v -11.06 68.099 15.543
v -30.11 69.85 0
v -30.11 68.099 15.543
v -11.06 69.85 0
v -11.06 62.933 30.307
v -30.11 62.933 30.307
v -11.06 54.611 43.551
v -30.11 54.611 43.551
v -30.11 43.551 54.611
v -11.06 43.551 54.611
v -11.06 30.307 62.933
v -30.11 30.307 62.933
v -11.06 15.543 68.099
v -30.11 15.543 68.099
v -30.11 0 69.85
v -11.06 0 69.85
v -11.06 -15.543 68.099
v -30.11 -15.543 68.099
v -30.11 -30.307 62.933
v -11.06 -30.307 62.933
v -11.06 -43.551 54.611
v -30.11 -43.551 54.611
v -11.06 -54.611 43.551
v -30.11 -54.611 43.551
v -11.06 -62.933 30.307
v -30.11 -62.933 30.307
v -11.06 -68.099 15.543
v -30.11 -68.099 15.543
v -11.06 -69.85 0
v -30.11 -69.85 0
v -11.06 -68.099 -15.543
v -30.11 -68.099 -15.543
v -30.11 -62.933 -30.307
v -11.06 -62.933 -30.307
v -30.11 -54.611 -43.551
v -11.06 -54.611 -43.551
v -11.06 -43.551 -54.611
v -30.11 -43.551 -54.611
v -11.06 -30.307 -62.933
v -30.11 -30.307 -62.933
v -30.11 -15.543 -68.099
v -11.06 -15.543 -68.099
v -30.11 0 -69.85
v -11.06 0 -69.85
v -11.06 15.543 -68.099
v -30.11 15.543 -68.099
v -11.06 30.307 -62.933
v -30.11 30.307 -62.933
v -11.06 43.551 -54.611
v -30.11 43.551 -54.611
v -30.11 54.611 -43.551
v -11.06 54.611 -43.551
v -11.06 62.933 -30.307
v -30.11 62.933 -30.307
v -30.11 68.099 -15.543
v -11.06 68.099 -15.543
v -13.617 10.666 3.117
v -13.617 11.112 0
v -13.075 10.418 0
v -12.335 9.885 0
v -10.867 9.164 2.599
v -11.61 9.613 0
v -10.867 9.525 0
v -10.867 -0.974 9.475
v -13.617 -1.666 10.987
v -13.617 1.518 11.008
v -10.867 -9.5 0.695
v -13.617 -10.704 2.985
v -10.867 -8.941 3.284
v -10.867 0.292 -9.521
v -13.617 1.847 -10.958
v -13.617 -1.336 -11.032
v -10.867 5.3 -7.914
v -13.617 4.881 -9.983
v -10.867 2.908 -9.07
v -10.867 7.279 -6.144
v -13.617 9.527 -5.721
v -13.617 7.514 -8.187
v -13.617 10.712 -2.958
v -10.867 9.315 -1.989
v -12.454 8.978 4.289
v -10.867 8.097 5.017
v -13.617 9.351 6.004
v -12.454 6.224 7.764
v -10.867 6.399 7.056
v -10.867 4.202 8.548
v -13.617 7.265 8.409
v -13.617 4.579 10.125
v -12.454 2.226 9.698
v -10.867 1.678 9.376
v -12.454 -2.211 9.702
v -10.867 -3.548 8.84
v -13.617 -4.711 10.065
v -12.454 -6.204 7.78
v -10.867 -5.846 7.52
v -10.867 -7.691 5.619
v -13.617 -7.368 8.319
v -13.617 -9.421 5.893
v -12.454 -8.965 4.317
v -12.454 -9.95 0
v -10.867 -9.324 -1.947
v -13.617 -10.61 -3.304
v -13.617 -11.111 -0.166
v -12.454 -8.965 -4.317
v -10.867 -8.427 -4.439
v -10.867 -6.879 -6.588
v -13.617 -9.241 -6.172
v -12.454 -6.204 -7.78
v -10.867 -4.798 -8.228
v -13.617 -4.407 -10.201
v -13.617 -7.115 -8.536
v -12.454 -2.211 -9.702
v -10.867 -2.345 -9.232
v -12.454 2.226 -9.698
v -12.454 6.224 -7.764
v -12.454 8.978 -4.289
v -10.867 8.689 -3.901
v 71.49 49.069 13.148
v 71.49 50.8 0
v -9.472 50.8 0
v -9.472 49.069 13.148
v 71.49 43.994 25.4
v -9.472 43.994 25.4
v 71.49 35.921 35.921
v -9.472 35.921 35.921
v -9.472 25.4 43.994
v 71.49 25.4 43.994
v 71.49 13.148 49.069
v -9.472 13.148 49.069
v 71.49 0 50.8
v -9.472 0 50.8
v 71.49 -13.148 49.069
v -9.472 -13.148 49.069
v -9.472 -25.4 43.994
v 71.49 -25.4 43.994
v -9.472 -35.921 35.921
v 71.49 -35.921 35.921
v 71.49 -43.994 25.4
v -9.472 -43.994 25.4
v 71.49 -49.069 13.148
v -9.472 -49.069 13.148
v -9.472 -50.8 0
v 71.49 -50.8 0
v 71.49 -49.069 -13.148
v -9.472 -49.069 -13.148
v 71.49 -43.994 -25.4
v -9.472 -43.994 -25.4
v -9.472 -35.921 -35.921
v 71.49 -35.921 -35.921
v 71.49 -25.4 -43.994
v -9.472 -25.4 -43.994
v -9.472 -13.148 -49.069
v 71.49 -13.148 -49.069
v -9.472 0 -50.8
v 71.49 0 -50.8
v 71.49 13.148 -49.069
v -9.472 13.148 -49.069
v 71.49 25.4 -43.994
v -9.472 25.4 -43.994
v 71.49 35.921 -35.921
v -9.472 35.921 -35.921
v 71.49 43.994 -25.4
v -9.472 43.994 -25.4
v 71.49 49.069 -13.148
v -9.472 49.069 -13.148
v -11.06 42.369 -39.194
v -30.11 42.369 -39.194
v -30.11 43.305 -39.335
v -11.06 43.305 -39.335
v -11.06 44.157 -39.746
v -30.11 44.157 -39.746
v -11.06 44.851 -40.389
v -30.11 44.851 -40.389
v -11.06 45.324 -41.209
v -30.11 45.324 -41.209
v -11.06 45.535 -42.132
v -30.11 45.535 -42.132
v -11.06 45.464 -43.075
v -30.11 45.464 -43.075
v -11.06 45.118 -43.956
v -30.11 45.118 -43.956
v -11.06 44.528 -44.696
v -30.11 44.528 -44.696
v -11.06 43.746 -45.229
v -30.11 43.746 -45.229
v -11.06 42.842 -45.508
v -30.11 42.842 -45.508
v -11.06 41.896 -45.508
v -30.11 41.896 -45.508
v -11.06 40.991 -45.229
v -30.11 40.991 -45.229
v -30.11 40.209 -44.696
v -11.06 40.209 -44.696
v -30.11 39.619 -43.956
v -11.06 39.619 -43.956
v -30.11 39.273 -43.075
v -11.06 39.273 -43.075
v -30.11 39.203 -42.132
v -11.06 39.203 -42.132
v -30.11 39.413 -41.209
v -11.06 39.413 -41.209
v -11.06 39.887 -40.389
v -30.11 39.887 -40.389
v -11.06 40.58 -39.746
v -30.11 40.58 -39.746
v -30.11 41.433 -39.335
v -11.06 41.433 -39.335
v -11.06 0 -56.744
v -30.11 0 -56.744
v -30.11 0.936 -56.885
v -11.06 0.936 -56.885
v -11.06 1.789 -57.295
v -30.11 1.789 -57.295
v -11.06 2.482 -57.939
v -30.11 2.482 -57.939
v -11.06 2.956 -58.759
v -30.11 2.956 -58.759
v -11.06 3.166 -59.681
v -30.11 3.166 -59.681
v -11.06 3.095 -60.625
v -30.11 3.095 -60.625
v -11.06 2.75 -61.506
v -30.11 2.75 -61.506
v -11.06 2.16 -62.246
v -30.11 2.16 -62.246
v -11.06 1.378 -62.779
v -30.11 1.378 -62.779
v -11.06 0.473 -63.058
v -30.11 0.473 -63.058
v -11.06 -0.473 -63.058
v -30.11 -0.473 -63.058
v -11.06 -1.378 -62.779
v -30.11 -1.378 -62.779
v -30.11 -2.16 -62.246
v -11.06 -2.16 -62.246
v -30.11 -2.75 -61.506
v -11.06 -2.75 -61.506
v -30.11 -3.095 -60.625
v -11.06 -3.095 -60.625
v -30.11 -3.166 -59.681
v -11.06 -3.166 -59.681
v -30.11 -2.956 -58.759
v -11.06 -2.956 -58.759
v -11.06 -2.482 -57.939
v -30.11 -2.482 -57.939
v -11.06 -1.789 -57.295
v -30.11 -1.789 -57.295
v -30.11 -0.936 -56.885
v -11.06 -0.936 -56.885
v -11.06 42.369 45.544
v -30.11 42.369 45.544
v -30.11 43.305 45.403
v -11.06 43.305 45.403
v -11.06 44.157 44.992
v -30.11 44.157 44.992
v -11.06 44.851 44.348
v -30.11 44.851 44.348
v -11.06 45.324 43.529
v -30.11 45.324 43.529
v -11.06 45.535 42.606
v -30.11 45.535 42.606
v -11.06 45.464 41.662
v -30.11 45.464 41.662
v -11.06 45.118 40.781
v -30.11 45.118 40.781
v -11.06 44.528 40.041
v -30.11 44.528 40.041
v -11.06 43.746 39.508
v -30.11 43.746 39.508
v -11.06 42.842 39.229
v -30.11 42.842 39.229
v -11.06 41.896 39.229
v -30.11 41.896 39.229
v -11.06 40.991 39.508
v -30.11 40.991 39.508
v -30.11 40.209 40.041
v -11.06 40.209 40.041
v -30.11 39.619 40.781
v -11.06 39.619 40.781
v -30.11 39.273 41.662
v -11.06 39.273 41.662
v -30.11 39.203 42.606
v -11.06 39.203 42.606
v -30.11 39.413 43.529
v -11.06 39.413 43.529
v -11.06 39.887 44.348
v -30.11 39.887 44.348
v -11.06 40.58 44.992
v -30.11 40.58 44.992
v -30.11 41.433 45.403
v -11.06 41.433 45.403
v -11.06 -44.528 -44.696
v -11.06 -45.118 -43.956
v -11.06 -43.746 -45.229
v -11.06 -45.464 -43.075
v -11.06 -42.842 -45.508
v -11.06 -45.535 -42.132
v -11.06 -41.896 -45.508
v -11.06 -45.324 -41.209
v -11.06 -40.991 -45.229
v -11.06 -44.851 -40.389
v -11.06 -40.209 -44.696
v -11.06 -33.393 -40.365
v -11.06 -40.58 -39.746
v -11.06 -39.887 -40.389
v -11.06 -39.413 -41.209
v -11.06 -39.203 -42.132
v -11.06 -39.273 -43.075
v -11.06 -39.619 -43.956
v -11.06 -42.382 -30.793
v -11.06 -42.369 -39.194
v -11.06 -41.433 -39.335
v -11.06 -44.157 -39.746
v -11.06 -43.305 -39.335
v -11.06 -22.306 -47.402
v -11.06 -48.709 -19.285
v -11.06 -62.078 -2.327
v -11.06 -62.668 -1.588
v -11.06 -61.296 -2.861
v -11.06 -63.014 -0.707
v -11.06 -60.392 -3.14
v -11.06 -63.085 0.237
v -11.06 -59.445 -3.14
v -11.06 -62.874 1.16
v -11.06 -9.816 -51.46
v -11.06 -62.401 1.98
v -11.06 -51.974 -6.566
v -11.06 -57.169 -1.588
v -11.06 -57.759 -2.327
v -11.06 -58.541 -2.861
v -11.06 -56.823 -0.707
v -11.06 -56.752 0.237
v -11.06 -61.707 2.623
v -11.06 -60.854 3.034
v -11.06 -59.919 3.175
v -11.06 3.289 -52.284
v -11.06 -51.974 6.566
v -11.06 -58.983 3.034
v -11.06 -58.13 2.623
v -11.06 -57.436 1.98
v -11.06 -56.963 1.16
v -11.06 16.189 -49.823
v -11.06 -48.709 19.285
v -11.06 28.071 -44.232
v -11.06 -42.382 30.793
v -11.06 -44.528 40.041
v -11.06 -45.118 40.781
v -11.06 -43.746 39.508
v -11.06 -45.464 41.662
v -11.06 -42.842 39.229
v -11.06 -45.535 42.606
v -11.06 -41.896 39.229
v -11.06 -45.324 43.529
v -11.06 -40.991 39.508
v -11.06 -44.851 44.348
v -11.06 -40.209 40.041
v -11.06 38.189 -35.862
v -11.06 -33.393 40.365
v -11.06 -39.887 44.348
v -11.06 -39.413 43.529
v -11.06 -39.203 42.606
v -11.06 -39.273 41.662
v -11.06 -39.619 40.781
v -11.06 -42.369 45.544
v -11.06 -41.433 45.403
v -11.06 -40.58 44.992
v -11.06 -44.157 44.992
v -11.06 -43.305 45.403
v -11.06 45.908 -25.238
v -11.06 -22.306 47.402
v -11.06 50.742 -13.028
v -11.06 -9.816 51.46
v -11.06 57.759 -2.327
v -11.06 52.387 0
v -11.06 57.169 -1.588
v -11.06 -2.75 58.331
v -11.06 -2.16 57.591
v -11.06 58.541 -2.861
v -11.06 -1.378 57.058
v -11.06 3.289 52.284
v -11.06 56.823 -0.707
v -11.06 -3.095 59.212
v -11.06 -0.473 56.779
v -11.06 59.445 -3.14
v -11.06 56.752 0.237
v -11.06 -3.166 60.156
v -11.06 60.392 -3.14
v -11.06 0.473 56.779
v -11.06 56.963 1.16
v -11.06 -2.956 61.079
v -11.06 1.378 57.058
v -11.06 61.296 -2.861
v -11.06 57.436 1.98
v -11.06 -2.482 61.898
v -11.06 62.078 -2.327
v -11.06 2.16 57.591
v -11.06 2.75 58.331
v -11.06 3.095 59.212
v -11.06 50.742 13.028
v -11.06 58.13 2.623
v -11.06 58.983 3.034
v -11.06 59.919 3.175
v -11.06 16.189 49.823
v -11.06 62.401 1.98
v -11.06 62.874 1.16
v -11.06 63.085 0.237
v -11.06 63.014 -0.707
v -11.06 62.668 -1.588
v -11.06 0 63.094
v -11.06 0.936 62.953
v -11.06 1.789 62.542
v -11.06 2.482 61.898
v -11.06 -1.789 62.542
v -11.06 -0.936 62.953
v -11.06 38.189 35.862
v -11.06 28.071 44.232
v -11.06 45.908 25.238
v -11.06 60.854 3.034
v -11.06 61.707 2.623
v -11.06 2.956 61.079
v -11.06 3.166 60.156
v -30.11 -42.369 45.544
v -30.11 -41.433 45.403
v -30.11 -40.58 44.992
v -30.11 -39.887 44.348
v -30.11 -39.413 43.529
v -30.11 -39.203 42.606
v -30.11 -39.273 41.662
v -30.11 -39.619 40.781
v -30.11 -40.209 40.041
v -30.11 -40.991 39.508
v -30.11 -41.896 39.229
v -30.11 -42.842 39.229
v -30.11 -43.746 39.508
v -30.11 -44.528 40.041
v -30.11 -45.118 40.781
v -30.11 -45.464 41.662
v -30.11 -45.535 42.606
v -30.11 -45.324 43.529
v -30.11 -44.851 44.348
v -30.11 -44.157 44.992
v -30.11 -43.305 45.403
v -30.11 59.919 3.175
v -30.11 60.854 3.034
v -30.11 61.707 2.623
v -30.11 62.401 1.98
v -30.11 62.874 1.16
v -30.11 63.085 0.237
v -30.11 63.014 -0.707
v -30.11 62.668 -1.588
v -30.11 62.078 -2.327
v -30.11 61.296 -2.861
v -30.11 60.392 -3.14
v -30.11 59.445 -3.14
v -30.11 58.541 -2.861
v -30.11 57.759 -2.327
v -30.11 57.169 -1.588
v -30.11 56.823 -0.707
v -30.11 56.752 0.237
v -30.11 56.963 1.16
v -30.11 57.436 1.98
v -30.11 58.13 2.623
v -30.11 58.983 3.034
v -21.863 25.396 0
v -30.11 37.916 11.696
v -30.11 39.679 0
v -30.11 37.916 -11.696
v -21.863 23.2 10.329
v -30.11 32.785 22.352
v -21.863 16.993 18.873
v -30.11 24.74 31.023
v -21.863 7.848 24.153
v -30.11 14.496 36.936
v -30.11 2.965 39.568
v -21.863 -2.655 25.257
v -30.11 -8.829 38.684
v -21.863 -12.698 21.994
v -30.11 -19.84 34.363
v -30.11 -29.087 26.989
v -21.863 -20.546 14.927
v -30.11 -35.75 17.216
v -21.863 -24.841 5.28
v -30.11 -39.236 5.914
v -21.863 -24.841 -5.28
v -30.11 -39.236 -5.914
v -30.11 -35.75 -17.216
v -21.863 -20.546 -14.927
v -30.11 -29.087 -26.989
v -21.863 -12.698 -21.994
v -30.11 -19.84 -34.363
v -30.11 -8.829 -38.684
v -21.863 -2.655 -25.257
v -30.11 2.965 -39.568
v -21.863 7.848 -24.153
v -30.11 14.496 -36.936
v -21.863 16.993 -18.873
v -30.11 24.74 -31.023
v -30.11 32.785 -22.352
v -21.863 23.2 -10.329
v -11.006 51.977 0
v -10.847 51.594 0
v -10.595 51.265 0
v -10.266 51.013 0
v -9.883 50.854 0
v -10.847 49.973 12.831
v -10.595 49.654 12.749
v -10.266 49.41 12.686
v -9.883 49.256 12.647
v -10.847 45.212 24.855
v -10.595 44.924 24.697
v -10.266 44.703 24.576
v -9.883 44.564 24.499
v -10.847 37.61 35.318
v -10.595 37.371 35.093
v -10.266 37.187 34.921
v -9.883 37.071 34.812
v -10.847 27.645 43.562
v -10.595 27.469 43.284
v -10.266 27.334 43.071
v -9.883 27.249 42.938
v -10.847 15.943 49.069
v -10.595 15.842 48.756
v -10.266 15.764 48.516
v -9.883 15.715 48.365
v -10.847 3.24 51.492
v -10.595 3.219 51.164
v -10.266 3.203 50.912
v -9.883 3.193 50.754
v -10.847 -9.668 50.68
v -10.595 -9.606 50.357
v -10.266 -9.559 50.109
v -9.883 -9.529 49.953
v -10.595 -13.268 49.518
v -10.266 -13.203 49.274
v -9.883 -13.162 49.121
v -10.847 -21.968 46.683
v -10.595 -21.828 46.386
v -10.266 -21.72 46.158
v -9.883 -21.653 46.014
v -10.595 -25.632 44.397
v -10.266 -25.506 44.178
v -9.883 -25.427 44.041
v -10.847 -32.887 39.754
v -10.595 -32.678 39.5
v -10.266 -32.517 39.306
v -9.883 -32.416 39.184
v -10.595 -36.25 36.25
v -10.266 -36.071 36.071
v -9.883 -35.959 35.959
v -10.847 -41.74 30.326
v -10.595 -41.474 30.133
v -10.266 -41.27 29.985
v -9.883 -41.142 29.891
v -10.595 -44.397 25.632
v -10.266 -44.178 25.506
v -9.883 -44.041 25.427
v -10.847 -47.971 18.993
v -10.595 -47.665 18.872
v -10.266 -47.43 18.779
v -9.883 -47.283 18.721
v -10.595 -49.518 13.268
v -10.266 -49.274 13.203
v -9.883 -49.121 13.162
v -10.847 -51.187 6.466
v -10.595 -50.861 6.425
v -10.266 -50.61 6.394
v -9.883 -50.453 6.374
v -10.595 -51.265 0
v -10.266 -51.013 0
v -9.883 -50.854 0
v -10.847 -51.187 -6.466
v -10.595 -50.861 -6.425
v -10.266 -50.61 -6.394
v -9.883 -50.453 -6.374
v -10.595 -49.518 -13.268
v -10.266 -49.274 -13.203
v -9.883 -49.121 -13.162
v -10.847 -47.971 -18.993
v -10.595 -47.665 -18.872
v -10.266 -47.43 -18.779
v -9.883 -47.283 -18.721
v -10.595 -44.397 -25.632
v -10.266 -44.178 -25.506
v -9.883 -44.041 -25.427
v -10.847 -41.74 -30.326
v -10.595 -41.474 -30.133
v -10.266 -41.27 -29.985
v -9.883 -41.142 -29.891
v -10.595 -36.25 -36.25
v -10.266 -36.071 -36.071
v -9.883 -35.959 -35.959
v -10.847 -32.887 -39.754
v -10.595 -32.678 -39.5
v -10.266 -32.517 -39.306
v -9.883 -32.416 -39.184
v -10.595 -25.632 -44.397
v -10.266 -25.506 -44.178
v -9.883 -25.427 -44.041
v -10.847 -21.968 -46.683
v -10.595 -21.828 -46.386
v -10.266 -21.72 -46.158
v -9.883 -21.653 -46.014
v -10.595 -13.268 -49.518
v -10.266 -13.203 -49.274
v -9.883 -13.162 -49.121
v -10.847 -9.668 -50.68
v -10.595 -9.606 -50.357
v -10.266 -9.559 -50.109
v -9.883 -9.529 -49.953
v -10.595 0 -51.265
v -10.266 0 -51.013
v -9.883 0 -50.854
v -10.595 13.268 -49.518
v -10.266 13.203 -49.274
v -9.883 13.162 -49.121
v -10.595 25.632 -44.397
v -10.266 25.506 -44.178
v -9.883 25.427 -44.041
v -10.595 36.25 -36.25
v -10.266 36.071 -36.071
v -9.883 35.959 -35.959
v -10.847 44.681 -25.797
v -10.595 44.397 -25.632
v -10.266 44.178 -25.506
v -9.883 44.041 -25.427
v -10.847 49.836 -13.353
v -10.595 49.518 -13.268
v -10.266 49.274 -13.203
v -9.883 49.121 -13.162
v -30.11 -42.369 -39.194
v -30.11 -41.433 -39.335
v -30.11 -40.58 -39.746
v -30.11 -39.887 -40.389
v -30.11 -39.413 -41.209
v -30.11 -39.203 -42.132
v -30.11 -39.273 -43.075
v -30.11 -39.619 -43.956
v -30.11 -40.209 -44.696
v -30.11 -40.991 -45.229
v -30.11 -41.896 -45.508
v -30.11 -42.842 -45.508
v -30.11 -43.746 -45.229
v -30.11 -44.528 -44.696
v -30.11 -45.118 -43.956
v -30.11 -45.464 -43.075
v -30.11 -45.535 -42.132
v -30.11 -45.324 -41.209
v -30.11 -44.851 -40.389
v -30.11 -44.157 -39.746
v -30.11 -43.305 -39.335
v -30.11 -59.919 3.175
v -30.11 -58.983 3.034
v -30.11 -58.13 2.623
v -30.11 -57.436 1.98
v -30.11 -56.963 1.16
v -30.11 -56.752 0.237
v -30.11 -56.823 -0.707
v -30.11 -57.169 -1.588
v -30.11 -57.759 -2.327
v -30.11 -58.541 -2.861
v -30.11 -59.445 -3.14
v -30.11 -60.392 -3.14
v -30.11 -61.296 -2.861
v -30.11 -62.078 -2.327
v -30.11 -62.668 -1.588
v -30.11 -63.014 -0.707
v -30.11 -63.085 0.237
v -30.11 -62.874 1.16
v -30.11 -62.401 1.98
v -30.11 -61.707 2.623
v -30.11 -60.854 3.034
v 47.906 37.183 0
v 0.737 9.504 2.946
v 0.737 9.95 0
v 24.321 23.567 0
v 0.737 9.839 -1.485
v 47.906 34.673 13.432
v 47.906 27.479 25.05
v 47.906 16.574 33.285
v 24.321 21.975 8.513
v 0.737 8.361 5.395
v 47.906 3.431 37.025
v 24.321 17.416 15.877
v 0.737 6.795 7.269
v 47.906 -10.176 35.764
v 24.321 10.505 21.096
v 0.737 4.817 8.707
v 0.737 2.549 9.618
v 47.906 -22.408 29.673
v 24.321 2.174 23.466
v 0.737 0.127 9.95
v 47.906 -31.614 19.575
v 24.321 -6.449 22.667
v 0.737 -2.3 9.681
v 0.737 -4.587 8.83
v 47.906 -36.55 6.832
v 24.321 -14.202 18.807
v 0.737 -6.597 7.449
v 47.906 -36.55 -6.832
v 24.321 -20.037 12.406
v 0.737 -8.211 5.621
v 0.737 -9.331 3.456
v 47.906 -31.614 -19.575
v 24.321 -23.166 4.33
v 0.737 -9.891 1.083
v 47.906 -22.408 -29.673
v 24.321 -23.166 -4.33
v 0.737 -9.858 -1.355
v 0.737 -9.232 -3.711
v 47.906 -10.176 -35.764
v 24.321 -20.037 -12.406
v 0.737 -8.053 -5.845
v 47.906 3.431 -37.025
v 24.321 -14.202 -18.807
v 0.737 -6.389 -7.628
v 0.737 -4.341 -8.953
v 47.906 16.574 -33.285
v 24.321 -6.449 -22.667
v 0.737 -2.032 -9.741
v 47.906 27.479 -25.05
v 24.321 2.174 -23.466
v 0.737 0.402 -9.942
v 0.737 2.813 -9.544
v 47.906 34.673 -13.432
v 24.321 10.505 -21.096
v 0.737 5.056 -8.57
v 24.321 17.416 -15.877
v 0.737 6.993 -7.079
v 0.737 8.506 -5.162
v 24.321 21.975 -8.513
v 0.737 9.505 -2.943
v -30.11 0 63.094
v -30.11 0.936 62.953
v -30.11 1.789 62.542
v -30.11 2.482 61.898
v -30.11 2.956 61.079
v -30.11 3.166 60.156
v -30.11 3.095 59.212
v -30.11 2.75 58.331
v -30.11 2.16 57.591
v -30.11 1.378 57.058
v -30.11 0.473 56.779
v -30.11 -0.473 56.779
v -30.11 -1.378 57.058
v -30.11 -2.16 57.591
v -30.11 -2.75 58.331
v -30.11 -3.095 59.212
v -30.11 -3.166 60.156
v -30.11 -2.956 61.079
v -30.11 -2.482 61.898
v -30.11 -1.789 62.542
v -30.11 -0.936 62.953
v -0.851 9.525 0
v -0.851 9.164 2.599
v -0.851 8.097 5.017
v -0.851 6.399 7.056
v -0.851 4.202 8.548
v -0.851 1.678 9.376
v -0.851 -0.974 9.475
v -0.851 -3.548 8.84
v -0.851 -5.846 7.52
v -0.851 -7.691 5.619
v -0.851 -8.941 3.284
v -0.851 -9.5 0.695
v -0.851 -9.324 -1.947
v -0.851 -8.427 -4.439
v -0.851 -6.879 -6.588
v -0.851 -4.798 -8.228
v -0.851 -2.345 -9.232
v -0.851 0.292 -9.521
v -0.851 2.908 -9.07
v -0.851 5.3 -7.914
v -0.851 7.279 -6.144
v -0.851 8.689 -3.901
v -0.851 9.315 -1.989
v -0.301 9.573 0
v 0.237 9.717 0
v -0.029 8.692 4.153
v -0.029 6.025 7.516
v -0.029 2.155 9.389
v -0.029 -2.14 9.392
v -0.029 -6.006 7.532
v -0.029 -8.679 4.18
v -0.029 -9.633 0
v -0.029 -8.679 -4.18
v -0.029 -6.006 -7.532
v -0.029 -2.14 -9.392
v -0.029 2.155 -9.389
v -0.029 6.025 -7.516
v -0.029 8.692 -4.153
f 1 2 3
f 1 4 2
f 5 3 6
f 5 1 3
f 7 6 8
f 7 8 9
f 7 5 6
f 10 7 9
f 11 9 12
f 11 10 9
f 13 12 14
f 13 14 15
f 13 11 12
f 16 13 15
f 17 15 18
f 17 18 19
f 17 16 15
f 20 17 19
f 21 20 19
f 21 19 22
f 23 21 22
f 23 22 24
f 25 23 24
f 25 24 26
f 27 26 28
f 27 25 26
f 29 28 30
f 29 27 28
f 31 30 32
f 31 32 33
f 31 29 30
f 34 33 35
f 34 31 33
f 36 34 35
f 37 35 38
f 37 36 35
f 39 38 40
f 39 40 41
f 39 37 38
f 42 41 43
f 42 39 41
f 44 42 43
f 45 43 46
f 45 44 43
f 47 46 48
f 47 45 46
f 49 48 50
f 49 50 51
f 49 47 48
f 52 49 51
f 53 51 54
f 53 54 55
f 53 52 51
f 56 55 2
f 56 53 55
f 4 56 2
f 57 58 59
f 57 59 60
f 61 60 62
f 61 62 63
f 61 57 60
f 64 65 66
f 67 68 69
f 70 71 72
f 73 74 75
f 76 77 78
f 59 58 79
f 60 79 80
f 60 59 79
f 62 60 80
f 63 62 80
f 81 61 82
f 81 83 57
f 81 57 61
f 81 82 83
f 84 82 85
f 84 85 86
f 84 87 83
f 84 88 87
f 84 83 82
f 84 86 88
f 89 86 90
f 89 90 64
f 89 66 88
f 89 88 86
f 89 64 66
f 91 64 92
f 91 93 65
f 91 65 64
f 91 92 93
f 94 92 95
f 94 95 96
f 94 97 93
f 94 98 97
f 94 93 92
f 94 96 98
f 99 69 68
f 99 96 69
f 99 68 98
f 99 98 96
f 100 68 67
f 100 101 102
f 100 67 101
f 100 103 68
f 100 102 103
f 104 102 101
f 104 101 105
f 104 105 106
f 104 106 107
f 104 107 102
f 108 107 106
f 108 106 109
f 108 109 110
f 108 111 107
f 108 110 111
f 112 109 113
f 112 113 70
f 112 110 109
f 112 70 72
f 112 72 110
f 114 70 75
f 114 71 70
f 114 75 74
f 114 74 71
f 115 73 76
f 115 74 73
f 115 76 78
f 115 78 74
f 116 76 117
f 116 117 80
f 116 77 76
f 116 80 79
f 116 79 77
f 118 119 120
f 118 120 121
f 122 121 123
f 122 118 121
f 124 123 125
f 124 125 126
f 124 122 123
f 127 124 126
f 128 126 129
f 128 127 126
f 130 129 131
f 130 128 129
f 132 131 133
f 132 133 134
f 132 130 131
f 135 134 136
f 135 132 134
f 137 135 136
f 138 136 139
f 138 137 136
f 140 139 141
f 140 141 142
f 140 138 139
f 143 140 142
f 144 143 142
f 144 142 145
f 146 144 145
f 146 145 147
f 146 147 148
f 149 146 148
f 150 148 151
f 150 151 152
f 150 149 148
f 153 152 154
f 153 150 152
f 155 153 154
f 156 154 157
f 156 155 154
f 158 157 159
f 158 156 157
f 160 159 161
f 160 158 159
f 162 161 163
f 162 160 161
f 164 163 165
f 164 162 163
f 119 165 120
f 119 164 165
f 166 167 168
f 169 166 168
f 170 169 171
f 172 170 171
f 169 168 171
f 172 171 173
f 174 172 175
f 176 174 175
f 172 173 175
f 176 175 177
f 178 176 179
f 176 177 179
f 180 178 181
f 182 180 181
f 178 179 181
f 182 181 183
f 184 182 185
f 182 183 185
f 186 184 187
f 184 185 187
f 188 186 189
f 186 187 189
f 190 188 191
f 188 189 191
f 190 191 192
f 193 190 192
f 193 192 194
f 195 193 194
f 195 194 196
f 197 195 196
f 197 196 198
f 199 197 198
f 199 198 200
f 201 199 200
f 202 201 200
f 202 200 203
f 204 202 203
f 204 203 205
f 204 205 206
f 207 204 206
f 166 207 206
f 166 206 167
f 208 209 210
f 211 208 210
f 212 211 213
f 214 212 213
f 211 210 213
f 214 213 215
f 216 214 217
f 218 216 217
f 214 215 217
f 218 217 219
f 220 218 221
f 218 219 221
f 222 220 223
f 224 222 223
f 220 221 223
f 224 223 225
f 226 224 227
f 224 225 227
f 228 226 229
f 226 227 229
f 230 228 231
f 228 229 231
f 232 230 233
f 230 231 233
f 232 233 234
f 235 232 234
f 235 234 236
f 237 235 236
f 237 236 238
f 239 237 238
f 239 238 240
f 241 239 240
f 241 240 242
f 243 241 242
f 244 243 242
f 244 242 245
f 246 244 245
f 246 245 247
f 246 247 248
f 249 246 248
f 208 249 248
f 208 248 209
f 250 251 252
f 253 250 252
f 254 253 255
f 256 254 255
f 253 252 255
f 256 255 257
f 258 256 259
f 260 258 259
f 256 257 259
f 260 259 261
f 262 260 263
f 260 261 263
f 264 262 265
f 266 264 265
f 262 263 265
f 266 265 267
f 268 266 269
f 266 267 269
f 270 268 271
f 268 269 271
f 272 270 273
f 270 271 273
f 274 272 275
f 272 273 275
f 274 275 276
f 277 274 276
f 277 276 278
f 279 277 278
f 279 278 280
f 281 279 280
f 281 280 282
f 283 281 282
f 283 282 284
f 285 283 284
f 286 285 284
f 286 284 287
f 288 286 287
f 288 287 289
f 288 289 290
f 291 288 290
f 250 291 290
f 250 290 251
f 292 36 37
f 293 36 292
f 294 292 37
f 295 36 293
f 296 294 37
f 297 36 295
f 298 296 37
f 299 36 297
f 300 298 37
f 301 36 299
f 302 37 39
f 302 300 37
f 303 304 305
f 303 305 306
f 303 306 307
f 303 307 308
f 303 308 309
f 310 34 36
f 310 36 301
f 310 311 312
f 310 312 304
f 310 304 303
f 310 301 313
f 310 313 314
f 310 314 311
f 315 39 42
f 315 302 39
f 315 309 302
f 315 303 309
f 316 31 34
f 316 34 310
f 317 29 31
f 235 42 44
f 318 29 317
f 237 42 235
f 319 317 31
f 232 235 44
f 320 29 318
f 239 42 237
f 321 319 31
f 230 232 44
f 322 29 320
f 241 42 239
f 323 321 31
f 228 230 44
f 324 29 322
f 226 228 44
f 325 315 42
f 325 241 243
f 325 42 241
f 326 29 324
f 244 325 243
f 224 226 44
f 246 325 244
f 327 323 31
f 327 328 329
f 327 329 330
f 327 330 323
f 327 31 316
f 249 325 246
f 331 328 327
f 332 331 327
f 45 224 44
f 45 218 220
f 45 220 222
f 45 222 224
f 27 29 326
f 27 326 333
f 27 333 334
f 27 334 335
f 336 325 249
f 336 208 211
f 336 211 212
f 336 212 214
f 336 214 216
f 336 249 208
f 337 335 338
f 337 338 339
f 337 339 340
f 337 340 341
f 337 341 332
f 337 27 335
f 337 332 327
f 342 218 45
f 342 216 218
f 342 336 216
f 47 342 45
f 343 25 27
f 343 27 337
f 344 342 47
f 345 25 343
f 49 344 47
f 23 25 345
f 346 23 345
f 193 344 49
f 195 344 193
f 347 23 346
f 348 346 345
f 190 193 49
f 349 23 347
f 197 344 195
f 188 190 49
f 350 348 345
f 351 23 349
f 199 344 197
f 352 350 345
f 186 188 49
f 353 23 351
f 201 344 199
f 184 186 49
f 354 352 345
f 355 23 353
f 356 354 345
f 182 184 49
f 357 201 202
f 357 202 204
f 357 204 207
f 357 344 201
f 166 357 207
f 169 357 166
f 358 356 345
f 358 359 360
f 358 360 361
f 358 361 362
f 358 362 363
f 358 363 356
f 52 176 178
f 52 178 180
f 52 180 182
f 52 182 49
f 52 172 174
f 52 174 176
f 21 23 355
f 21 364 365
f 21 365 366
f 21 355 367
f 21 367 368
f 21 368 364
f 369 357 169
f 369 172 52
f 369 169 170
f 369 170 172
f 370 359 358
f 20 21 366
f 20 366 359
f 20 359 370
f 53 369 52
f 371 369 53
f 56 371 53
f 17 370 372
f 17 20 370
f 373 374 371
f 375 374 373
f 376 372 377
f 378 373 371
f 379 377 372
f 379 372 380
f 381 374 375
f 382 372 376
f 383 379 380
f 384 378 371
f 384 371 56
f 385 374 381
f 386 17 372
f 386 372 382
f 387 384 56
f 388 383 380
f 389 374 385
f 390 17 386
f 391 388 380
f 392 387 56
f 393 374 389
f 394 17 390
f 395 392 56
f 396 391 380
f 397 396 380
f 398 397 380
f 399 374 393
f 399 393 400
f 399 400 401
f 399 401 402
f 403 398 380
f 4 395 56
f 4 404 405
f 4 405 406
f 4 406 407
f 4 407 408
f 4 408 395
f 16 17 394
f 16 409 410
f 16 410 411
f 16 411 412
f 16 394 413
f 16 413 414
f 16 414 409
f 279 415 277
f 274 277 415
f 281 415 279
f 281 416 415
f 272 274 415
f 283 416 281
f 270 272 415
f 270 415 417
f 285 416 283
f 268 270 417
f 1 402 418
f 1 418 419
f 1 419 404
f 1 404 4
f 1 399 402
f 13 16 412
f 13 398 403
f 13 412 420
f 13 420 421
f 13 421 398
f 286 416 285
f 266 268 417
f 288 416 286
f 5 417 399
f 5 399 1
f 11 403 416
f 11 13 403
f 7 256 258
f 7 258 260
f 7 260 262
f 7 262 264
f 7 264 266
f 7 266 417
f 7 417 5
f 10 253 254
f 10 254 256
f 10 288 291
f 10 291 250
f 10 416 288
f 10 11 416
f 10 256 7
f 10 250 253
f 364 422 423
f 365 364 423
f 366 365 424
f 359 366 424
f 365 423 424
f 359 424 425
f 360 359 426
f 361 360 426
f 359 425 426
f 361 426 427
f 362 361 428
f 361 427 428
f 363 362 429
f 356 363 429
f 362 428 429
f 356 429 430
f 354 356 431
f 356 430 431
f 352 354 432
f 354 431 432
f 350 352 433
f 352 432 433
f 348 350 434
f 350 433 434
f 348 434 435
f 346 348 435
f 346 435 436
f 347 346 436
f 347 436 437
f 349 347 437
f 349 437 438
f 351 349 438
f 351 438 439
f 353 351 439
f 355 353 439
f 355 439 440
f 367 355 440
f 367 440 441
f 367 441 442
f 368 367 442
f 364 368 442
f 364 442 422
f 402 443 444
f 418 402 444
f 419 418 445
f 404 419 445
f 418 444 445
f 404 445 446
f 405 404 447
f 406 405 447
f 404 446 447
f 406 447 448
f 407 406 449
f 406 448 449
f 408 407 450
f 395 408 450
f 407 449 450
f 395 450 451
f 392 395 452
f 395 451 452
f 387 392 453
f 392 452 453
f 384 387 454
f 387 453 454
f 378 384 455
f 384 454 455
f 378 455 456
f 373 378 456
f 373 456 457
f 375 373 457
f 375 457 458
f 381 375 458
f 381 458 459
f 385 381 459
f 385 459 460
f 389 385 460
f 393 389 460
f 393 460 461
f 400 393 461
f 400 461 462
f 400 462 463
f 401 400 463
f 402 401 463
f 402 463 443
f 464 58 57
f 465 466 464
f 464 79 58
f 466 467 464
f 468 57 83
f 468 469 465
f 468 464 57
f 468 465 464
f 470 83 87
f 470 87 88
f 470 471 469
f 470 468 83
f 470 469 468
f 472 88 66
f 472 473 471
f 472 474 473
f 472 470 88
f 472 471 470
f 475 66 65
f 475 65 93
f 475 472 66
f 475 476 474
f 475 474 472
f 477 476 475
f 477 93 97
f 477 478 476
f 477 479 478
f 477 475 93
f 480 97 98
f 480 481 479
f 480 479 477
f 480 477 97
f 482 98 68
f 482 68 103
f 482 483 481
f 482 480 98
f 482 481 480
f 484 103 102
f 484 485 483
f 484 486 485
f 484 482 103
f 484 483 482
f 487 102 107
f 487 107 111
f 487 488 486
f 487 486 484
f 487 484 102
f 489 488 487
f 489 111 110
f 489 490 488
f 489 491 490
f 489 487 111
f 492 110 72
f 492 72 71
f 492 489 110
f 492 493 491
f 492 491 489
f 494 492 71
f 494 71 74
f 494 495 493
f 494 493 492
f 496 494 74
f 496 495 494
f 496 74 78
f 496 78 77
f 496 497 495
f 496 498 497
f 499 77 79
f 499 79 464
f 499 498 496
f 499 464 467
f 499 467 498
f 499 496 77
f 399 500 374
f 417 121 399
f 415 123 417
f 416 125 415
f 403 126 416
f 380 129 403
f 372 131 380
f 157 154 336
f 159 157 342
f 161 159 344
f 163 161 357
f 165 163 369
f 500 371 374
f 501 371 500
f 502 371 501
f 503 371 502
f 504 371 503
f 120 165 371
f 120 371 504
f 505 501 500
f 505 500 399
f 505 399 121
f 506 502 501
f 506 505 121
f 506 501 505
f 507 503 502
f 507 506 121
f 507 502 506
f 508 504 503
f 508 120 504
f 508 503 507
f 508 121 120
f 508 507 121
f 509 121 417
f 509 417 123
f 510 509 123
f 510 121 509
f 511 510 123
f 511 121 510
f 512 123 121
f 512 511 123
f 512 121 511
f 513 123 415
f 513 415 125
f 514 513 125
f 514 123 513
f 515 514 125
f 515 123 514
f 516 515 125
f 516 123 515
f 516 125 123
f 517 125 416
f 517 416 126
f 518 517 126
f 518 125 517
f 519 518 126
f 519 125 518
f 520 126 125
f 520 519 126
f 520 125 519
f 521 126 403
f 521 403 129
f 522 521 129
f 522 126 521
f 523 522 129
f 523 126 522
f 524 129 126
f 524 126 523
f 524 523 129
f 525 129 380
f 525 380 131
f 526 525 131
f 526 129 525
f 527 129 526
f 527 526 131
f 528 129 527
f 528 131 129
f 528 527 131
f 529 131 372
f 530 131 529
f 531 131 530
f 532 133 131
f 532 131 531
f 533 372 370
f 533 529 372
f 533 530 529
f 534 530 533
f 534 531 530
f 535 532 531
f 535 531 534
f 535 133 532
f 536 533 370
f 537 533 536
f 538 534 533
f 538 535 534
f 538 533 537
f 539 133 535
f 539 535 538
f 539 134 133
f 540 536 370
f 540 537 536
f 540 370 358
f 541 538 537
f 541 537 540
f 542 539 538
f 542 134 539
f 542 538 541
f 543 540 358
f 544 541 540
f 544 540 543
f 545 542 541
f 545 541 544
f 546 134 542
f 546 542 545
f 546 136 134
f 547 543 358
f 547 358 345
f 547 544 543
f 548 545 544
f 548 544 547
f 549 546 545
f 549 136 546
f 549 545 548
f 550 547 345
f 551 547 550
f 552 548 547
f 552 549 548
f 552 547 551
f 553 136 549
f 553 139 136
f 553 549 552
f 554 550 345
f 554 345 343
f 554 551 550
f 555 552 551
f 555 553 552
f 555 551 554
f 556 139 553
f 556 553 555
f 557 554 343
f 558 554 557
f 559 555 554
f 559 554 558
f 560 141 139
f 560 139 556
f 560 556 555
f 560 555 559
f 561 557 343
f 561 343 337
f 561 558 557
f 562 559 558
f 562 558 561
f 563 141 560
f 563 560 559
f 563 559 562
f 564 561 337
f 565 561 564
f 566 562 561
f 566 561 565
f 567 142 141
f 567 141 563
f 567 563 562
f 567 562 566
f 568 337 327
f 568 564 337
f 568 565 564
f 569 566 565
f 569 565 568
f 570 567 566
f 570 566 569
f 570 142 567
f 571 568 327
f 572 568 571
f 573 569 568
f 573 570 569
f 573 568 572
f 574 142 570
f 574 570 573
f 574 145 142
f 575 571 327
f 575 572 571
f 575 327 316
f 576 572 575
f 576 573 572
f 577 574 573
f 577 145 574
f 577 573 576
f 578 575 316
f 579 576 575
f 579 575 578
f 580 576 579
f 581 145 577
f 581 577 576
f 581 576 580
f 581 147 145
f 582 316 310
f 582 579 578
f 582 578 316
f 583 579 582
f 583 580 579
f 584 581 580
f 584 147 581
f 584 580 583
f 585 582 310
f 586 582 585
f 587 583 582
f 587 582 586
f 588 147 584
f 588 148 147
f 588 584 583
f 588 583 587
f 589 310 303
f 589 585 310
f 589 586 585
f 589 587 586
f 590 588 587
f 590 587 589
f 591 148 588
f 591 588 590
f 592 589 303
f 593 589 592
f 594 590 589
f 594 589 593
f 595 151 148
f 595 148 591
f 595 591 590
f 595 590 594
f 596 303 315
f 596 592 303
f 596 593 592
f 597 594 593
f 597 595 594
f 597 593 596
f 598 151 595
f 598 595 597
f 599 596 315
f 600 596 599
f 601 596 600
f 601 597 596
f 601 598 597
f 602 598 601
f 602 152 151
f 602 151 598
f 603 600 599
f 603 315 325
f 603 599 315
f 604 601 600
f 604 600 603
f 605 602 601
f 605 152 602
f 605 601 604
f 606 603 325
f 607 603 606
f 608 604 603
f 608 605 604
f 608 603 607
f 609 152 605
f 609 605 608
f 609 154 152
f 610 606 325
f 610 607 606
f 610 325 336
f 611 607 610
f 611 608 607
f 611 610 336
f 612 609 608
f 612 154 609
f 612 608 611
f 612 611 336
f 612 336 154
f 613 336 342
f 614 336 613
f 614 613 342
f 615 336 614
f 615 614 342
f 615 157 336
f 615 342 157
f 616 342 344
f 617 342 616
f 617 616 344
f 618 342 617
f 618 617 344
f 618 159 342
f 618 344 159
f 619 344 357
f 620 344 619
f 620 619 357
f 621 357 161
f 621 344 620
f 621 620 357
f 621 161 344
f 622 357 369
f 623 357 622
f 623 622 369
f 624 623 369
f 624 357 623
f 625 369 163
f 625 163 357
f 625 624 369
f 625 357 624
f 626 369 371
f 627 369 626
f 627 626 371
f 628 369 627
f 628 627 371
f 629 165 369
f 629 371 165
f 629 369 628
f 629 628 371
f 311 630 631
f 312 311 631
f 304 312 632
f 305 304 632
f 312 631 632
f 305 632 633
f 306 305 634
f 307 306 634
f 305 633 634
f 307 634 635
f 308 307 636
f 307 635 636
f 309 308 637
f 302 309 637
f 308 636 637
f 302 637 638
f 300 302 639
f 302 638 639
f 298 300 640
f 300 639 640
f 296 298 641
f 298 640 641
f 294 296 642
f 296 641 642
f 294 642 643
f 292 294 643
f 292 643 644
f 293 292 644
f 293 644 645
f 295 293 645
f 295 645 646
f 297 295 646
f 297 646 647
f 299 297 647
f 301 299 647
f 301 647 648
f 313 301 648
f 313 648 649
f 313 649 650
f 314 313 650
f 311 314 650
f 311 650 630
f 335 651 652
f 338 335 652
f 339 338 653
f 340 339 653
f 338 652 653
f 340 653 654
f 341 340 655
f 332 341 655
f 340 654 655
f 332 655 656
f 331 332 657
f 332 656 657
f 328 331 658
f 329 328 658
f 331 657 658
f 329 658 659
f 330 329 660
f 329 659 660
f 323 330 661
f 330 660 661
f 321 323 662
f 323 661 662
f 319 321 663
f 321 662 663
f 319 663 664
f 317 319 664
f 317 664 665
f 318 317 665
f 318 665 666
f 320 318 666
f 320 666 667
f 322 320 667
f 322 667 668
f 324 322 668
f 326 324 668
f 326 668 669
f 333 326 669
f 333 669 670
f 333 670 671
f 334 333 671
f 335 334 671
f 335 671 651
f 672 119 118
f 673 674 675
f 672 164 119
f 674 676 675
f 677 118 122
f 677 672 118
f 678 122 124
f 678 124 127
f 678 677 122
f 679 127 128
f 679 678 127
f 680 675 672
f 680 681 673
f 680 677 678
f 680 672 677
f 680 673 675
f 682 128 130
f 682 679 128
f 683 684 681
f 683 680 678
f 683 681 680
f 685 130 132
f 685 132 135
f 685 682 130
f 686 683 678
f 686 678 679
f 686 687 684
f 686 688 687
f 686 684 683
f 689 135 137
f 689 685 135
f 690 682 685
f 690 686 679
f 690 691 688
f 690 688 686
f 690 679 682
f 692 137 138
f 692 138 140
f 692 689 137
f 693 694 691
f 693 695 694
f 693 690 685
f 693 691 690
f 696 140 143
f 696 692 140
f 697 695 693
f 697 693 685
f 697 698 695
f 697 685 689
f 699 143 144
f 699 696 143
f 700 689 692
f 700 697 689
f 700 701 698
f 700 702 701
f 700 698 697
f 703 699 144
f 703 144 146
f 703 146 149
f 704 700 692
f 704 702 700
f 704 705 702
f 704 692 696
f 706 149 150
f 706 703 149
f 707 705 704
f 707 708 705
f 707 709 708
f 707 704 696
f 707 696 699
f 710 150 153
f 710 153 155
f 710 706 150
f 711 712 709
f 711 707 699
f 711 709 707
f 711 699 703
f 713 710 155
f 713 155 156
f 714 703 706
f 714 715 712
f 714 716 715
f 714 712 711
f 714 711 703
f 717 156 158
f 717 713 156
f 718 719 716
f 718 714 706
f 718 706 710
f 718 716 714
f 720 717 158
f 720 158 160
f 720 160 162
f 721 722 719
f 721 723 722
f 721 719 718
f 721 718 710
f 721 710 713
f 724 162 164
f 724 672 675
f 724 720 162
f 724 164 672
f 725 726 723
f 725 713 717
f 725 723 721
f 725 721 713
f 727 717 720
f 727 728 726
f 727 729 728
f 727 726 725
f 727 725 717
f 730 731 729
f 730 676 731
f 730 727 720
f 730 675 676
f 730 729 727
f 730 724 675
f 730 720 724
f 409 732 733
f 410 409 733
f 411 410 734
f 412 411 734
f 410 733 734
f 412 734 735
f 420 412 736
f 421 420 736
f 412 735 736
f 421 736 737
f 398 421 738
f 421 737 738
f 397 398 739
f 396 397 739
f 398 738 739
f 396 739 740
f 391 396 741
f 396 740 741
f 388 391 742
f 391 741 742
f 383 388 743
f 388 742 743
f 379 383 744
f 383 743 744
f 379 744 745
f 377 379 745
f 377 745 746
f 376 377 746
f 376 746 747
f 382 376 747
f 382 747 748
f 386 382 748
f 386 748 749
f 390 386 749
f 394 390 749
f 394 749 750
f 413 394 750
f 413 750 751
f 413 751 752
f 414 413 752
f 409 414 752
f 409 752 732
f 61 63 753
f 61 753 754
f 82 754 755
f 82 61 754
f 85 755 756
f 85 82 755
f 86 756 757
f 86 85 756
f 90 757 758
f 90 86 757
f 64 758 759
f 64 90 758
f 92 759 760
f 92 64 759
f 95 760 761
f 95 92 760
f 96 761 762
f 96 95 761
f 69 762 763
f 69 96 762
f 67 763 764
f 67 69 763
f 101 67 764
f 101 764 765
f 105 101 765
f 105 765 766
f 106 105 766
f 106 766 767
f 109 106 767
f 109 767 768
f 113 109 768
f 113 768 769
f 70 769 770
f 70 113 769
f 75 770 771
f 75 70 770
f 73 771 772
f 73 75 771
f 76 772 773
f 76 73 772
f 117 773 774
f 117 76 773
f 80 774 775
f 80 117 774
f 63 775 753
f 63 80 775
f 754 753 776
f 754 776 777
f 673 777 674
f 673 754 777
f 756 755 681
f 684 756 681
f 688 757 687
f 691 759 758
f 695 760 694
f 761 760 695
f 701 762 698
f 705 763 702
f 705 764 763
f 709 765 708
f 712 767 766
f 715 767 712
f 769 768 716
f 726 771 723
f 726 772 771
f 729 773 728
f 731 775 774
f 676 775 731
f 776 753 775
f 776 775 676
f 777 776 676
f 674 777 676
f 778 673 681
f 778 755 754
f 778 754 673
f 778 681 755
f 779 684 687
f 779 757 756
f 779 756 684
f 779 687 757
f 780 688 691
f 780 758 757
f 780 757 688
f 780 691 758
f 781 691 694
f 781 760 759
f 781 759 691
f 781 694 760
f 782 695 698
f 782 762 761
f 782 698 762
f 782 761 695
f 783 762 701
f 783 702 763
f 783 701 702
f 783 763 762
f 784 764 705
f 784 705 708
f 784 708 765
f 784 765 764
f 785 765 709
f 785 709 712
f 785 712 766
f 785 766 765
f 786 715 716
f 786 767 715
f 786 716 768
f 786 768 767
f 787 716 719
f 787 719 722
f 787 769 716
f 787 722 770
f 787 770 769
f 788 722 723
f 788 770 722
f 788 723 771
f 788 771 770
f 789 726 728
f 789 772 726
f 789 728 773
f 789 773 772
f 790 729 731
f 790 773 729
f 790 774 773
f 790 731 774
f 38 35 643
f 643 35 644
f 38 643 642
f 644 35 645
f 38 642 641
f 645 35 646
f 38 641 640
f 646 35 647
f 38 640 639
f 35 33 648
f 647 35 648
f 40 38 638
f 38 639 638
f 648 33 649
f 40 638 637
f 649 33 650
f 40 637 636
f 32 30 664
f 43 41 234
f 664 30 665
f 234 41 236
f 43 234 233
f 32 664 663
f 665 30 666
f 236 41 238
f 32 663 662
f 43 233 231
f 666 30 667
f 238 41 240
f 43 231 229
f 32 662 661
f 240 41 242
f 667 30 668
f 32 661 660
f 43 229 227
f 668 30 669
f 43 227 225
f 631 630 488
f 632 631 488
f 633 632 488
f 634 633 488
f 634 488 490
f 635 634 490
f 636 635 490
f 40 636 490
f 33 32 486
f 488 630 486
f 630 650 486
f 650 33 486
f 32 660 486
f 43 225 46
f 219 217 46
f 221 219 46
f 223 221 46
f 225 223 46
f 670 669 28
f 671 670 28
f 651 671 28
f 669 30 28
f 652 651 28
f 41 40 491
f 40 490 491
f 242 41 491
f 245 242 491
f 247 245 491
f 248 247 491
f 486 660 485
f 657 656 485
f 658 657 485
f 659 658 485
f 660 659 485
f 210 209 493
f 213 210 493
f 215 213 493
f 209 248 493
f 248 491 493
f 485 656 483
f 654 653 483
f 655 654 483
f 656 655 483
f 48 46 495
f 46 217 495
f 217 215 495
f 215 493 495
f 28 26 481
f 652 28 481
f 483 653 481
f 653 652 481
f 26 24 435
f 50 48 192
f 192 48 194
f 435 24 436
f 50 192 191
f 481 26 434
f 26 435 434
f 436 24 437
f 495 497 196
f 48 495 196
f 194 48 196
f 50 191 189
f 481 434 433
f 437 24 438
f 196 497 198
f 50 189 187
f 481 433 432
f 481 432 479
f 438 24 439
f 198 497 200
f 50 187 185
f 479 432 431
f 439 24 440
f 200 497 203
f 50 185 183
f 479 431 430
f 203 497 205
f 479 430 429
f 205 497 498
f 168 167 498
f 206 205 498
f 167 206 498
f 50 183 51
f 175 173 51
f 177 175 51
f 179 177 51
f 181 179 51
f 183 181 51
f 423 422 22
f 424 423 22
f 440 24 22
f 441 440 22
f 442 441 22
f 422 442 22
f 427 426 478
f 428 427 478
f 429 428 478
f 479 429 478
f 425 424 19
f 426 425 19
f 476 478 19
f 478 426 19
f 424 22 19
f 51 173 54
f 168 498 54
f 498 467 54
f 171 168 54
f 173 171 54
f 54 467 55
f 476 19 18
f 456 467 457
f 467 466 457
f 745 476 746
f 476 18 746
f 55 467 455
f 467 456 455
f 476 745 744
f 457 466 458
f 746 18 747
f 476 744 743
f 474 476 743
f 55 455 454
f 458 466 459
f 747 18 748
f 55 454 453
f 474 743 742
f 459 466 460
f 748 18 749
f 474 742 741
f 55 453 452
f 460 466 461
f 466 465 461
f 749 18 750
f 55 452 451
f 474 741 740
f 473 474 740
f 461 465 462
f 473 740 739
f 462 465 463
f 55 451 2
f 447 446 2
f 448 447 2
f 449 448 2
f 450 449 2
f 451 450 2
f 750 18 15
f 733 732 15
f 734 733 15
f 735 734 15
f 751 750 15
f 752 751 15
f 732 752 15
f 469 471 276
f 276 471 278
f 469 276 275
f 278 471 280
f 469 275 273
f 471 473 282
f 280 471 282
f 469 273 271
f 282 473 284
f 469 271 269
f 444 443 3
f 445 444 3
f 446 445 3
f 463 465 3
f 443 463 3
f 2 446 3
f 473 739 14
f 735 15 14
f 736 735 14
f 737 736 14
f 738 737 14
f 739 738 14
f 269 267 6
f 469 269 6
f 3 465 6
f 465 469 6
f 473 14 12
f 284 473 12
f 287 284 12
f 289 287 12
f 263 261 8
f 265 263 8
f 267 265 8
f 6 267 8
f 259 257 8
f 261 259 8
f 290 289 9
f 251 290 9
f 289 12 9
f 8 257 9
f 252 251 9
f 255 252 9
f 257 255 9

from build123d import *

# Parameters (mm, degrees)
CUT_EXTRUDE2_REACH = 103.6
SKETCH3_R          = 3.175
FILLET1_R          = 3.175
FILLET2_R          = 1.5875


with BuildPart() as part:
    # Sketch1 → Revolve1 (revolve)
    with BuildSketch(Plane.XY):
        Polygon((-12.7, 9.525), (-30.109602918, 39.679316793), (-30.109602918, 50.8), (-30.109602918, 69.85), (-11.059602918, 69.85), (-11.059602918, 50.8), (71.490397082, 50.8), (0, 9.525), align=None)
    revolve(axis=Axis((0, 0, 0), (1, 0, 0)))

    # Sketch3 → Cut-Extrude2 (cut, up to next)
    with BuildSketch(Plane.ZY.offset(30.109602918), mode=Mode.PRIVATE) as cut_extrude2_sk1:
        with Locations((0, 59.9186)):
            Circle(SKETCH3_R)
    cut_extrude2_tool1 = extrude(cut_extrude2_sk1.sketch, amount=-CUT_EXTRUDE2_REACH, mode=Mode.PRIVATE) & part.part
    add(cut_extrude2_tool1.solids().sort_by_distance((-30.109603, 59.9186, 0))[0], mode=Mode.SUBTRACT)
    # Sketch3 → Cut-Extrude2 (cut, up to next)
    with BuildSketch(Plane.ZY.offset(30.109602918), mode=Mode.PRIVATE) as cut_extrude2_sk2:
        with Locations((42.368848379, 42.368848379)):
            Circle(SKETCH3_R)
    cut_extrude2_tool2 = extrude(cut_extrude2_sk2.sketch, amount=-CUT_EXTRUDE2_REACH, mode=Mode.PRIVATE) & part.part
    add(cut_extrude2_tool2.solids().sort_by_distance((-30.109603, 42.368848, 42.368848))[0], mode=Mode.SUBTRACT)
    # Sketch3 → Cut-Extrude2 (cut, up to next)
    with BuildSketch(Plane.ZY.offset(30.109602918), mode=Mode.PRIVATE) as cut_extrude2_sk3:
        with Locations((59.9186, 0)):
            Circle(SKETCH3_R)
    cut_extrude2_tool3 = extrude(cut_extrude2_sk3.sketch, amount=-CUT_EXTRUDE2_REACH, mode=Mode.PRIVATE) & part.part
    add(cut_extrude2_tool3.solids().sort_by_distance((-30.109603, 0, 59.9186))[0], mode=Mode.SUBTRACT)
    # Sketch3 → Cut-Extrude2 (cut, up to next)
    with BuildSketch(Plane.ZY.offset(30.109602918), mode=Mode.PRIVATE) as cut_extrude2_sk4:
        with Locations((42.368848379, -42.368848379)):
            Circle(SKETCH3_R)
    cut_extrude2_tool4 = extrude(cut_extrude2_sk4.sketch, amount=-CUT_EXTRUDE2_REACH, mode=Mode.PRIVATE) & part.part
    add(cut_extrude2_tool4.solids().sort_by_distance((-30.109603, -42.368848, 42.368848))[0], mode=Mode.SUBTRACT)
    # Sketch3 → Cut-Extrude2 (cut, up to next)
    with BuildSketch(Plane.ZY.offset(30.109602918), mode=Mode.PRIVATE) as cut_extrude2_sk5:
        with Locations((0, -59.9186)):
            Circle(SKETCH3_R)
    cut_extrude2_tool5 = extrude(cut_extrude2_sk5.sketch, amount=-CUT_EXTRUDE2_REACH, mode=Mode.PRIVATE) & part.part
    add(cut_extrude2_tool5.solids().sort_by_distance((-30.109603, -59.9186, 0))[0], mode=Mode.SUBTRACT)
    # Sketch3 → Cut-Extrude2 (cut, up to next)
    with BuildSketch(Plane.ZY.offset(30.109602918), mode=Mode.PRIVATE) as cut_extrude2_sk6:
        with Locations((-42.368848379, -42.368848379)):
            Circle(SKETCH3_R)
    cut_extrude2_tool6 = extrude(cut_extrude2_sk6.sketch, amount=-CUT_EXTRUDE2_REACH, mode=Mode.PRIVATE) & part.part
    add(cut_extrude2_tool6.solids().sort_by_distance((-30.109603, -42.368848, -42.368848))[0], mode=Mode.SUBTRACT)
    # Sketch3 → Cut-Extrude2 (cut, up to next)
    with BuildSketch(Plane.ZY.offset(30.109602918), mode=Mode.PRIVATE) as cut_extrude2_sk7:
        with Locations((-59.9186, 0)):
            Circle(SKETCH3_R)
    cut_extrude2_tool7 = extrude(cut_extrude2_sk7.sketch, amount=-CUT_EXTRUDE2_REACH, mode=Mode.PRIVATE) & part.part
    add(cut_extrude2_tool7.solids().sort_by_distance((-30.109603, 0, -59.9186))[0], mode=Mode.SUBTRACT)
    # Sketch3 → Cut-Extrude2 (cut, up to next)
    with BuildSketch(Plane.ZY.offset(30.109602918), mode=Mode.PRIVATE) as cut_extrude2_sk8:
        with Locations((-42.368848379, 42.368848379)):
            Circle(SKETCH3_R)
    cut_extrude2_tool8 = extrude(cut_extrude2_sk8.sketch, amount=-CUT_EXTRUDE2_REACH, mode=Mode.PRIVATE) & part.part
    add(cut_extrude2_tool8.solids().sort_by_distance((-30.109603, 42.368848, -42.368848))[0], mode=Mode.SUBTRACT)

    # Fillet1
    fillet1_edges = [part.edges().sort_by_distance(p)[0] for p in [
        (0, -9.525, 0),
        (-12.7, -9.525, 0),
    ]]
    fillet(fillet1_edges, radius=FILLET1_R)

    # Fillet2
    fillet2_edges = [part.edges().sort_by_distance(p)[0] for p in [
        (-11.059602918, -50.8, 0),
    ]]
    fillet(fillet2_edges, radius=FILLET2_R)


solid = part.part
